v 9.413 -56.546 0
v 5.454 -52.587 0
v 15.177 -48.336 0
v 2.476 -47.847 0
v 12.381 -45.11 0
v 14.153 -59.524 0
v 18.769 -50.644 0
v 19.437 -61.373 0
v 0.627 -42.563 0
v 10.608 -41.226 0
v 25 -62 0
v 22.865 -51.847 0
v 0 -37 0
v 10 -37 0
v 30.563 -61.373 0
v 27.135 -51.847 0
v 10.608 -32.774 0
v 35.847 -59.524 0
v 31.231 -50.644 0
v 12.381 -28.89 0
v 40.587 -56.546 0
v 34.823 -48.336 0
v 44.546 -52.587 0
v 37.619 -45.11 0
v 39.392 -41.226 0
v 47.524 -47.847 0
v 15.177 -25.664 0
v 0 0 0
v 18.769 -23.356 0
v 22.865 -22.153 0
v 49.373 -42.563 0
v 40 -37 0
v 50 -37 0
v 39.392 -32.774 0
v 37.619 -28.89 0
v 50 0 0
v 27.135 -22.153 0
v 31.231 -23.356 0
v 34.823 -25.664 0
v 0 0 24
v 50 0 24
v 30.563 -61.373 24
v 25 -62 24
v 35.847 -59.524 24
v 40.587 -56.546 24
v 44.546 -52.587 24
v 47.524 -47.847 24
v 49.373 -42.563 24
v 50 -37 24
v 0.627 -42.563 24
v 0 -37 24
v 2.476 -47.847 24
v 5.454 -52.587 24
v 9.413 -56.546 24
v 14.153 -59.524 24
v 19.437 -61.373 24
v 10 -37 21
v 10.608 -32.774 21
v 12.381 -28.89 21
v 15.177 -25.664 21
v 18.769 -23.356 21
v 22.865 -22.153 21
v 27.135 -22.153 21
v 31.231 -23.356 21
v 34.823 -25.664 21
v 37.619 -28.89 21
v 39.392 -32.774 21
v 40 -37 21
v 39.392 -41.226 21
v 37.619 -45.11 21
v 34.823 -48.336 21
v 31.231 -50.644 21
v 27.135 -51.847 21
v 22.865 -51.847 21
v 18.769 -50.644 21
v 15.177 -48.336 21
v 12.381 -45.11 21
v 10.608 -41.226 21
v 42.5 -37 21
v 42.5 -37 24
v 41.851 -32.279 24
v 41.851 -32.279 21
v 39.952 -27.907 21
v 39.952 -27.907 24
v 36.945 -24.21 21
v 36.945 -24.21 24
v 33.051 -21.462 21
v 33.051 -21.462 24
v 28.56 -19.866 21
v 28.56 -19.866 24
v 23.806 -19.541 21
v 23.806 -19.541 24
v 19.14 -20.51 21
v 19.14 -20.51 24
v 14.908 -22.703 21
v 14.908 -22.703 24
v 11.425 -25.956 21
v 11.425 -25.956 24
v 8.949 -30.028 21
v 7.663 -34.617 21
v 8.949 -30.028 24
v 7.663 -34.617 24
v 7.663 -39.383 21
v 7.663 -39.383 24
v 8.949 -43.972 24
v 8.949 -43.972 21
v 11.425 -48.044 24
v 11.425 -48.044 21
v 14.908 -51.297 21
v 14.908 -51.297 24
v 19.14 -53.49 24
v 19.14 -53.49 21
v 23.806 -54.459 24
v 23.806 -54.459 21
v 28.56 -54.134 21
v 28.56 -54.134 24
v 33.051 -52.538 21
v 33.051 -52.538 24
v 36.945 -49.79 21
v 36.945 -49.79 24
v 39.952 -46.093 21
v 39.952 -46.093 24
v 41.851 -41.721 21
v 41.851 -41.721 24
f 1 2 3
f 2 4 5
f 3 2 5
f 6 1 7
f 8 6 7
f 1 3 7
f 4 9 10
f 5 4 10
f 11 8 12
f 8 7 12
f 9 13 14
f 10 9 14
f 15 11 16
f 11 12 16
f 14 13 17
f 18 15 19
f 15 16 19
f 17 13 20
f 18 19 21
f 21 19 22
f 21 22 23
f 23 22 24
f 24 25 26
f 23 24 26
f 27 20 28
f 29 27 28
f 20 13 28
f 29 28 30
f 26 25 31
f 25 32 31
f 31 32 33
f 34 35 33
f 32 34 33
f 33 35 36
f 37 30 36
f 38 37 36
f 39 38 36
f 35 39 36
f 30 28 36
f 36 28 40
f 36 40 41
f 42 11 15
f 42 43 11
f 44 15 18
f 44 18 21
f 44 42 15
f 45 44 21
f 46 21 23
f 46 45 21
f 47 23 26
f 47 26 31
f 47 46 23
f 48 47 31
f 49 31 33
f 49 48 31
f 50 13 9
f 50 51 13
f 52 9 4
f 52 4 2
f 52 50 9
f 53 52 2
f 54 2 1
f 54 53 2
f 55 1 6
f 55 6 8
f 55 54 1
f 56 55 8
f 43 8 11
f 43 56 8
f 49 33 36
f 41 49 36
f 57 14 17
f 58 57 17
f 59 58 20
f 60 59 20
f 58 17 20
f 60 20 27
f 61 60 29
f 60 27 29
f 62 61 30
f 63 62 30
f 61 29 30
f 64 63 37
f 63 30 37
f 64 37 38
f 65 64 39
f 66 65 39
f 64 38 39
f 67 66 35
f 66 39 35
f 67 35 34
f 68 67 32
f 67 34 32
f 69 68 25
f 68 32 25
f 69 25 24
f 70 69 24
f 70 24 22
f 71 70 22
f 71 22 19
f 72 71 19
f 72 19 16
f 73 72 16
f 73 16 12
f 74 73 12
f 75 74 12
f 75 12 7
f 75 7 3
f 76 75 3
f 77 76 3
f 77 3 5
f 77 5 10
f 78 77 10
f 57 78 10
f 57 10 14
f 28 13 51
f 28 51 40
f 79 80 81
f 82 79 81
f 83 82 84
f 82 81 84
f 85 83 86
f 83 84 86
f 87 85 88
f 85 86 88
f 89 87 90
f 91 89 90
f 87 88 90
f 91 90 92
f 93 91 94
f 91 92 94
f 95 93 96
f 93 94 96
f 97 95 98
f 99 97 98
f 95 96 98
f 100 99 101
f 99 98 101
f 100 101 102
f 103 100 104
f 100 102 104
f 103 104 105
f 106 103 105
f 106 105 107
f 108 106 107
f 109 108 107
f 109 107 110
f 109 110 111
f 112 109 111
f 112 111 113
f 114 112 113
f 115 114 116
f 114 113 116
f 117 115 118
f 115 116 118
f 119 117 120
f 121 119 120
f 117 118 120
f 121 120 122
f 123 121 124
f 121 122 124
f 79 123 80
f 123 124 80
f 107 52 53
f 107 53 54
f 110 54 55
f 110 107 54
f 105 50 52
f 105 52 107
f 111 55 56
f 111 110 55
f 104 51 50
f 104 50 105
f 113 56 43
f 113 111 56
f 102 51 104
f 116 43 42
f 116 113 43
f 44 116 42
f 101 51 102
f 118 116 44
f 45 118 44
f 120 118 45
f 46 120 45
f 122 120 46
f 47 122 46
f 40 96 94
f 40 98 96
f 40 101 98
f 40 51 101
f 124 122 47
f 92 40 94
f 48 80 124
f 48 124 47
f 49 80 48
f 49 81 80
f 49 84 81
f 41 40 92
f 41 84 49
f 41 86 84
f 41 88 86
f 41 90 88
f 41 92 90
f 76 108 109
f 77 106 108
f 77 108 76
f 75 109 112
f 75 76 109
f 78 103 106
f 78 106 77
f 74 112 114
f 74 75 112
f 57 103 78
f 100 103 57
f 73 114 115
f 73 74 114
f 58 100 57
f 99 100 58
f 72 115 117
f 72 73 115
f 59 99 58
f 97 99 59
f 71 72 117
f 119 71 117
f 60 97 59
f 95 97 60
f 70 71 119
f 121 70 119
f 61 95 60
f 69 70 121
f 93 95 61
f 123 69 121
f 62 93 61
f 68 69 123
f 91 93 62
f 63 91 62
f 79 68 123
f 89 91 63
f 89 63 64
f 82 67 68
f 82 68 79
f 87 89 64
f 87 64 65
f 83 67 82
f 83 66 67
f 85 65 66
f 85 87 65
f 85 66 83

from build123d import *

# Parameters (mm, degrees)
SKETCH_1_W          = 50
SKETCH_1_H          = 62
EXTRUDE_1_DEPTH     = 24
FILLET_1_R          = 25
SKETCH_2_R          = 15
CUT_EXTRUDE_1_DEPTH = 30
SKETCH_3_R          = 17.5
CUT_EXTRUDE_2_DEPTH = 3


with BuildPart() as part:
    # 草图1 → 拉伸1 (new body)
    with BuildSketch(Plane.XY):
        with Locations((25, -31)):
            Rectangle(SKETCH_1_W, SKETCH_1_H)
    extrude(amount=EXTRUDE_1_DEPTH)

    # 圆角1
    fillet_1_edges = [part.edges().sort_by_distance(p)[0] for p in [
        (0, -62, 12),
        (50, -62, 12),
    ]]
    fillet(fillet_1_edges, radius=FILLET_1_R - 0.0001)  # a hair under: the kernel refuses the full size

    # 草图2 → 切除-拉伸1 (cut)
    with BuildSketch(Plane(origin=(0, 0, 0), x_dir=(-1, 0, 0), z_dir=(0, 0, -1))):
        with Locations((-25, -37)):
            Circle(SKETCH_2_R)
    extrude(amount=-CUT_EXTRUDE_1_DEPTH, mode=Mode.SUBTRACT)

    # 草图3 → 切除-拉伸2 (cut)
    with BuildSketch(Plane.XY.offset(24)):
        with Locations((25, -37)):
            Circle(SKETCH_3_R)
    extrude(amount=-CUT_EXTRUDE_2_DEPTH, mode=Mode.SUBTRACT)


solid = part.part
